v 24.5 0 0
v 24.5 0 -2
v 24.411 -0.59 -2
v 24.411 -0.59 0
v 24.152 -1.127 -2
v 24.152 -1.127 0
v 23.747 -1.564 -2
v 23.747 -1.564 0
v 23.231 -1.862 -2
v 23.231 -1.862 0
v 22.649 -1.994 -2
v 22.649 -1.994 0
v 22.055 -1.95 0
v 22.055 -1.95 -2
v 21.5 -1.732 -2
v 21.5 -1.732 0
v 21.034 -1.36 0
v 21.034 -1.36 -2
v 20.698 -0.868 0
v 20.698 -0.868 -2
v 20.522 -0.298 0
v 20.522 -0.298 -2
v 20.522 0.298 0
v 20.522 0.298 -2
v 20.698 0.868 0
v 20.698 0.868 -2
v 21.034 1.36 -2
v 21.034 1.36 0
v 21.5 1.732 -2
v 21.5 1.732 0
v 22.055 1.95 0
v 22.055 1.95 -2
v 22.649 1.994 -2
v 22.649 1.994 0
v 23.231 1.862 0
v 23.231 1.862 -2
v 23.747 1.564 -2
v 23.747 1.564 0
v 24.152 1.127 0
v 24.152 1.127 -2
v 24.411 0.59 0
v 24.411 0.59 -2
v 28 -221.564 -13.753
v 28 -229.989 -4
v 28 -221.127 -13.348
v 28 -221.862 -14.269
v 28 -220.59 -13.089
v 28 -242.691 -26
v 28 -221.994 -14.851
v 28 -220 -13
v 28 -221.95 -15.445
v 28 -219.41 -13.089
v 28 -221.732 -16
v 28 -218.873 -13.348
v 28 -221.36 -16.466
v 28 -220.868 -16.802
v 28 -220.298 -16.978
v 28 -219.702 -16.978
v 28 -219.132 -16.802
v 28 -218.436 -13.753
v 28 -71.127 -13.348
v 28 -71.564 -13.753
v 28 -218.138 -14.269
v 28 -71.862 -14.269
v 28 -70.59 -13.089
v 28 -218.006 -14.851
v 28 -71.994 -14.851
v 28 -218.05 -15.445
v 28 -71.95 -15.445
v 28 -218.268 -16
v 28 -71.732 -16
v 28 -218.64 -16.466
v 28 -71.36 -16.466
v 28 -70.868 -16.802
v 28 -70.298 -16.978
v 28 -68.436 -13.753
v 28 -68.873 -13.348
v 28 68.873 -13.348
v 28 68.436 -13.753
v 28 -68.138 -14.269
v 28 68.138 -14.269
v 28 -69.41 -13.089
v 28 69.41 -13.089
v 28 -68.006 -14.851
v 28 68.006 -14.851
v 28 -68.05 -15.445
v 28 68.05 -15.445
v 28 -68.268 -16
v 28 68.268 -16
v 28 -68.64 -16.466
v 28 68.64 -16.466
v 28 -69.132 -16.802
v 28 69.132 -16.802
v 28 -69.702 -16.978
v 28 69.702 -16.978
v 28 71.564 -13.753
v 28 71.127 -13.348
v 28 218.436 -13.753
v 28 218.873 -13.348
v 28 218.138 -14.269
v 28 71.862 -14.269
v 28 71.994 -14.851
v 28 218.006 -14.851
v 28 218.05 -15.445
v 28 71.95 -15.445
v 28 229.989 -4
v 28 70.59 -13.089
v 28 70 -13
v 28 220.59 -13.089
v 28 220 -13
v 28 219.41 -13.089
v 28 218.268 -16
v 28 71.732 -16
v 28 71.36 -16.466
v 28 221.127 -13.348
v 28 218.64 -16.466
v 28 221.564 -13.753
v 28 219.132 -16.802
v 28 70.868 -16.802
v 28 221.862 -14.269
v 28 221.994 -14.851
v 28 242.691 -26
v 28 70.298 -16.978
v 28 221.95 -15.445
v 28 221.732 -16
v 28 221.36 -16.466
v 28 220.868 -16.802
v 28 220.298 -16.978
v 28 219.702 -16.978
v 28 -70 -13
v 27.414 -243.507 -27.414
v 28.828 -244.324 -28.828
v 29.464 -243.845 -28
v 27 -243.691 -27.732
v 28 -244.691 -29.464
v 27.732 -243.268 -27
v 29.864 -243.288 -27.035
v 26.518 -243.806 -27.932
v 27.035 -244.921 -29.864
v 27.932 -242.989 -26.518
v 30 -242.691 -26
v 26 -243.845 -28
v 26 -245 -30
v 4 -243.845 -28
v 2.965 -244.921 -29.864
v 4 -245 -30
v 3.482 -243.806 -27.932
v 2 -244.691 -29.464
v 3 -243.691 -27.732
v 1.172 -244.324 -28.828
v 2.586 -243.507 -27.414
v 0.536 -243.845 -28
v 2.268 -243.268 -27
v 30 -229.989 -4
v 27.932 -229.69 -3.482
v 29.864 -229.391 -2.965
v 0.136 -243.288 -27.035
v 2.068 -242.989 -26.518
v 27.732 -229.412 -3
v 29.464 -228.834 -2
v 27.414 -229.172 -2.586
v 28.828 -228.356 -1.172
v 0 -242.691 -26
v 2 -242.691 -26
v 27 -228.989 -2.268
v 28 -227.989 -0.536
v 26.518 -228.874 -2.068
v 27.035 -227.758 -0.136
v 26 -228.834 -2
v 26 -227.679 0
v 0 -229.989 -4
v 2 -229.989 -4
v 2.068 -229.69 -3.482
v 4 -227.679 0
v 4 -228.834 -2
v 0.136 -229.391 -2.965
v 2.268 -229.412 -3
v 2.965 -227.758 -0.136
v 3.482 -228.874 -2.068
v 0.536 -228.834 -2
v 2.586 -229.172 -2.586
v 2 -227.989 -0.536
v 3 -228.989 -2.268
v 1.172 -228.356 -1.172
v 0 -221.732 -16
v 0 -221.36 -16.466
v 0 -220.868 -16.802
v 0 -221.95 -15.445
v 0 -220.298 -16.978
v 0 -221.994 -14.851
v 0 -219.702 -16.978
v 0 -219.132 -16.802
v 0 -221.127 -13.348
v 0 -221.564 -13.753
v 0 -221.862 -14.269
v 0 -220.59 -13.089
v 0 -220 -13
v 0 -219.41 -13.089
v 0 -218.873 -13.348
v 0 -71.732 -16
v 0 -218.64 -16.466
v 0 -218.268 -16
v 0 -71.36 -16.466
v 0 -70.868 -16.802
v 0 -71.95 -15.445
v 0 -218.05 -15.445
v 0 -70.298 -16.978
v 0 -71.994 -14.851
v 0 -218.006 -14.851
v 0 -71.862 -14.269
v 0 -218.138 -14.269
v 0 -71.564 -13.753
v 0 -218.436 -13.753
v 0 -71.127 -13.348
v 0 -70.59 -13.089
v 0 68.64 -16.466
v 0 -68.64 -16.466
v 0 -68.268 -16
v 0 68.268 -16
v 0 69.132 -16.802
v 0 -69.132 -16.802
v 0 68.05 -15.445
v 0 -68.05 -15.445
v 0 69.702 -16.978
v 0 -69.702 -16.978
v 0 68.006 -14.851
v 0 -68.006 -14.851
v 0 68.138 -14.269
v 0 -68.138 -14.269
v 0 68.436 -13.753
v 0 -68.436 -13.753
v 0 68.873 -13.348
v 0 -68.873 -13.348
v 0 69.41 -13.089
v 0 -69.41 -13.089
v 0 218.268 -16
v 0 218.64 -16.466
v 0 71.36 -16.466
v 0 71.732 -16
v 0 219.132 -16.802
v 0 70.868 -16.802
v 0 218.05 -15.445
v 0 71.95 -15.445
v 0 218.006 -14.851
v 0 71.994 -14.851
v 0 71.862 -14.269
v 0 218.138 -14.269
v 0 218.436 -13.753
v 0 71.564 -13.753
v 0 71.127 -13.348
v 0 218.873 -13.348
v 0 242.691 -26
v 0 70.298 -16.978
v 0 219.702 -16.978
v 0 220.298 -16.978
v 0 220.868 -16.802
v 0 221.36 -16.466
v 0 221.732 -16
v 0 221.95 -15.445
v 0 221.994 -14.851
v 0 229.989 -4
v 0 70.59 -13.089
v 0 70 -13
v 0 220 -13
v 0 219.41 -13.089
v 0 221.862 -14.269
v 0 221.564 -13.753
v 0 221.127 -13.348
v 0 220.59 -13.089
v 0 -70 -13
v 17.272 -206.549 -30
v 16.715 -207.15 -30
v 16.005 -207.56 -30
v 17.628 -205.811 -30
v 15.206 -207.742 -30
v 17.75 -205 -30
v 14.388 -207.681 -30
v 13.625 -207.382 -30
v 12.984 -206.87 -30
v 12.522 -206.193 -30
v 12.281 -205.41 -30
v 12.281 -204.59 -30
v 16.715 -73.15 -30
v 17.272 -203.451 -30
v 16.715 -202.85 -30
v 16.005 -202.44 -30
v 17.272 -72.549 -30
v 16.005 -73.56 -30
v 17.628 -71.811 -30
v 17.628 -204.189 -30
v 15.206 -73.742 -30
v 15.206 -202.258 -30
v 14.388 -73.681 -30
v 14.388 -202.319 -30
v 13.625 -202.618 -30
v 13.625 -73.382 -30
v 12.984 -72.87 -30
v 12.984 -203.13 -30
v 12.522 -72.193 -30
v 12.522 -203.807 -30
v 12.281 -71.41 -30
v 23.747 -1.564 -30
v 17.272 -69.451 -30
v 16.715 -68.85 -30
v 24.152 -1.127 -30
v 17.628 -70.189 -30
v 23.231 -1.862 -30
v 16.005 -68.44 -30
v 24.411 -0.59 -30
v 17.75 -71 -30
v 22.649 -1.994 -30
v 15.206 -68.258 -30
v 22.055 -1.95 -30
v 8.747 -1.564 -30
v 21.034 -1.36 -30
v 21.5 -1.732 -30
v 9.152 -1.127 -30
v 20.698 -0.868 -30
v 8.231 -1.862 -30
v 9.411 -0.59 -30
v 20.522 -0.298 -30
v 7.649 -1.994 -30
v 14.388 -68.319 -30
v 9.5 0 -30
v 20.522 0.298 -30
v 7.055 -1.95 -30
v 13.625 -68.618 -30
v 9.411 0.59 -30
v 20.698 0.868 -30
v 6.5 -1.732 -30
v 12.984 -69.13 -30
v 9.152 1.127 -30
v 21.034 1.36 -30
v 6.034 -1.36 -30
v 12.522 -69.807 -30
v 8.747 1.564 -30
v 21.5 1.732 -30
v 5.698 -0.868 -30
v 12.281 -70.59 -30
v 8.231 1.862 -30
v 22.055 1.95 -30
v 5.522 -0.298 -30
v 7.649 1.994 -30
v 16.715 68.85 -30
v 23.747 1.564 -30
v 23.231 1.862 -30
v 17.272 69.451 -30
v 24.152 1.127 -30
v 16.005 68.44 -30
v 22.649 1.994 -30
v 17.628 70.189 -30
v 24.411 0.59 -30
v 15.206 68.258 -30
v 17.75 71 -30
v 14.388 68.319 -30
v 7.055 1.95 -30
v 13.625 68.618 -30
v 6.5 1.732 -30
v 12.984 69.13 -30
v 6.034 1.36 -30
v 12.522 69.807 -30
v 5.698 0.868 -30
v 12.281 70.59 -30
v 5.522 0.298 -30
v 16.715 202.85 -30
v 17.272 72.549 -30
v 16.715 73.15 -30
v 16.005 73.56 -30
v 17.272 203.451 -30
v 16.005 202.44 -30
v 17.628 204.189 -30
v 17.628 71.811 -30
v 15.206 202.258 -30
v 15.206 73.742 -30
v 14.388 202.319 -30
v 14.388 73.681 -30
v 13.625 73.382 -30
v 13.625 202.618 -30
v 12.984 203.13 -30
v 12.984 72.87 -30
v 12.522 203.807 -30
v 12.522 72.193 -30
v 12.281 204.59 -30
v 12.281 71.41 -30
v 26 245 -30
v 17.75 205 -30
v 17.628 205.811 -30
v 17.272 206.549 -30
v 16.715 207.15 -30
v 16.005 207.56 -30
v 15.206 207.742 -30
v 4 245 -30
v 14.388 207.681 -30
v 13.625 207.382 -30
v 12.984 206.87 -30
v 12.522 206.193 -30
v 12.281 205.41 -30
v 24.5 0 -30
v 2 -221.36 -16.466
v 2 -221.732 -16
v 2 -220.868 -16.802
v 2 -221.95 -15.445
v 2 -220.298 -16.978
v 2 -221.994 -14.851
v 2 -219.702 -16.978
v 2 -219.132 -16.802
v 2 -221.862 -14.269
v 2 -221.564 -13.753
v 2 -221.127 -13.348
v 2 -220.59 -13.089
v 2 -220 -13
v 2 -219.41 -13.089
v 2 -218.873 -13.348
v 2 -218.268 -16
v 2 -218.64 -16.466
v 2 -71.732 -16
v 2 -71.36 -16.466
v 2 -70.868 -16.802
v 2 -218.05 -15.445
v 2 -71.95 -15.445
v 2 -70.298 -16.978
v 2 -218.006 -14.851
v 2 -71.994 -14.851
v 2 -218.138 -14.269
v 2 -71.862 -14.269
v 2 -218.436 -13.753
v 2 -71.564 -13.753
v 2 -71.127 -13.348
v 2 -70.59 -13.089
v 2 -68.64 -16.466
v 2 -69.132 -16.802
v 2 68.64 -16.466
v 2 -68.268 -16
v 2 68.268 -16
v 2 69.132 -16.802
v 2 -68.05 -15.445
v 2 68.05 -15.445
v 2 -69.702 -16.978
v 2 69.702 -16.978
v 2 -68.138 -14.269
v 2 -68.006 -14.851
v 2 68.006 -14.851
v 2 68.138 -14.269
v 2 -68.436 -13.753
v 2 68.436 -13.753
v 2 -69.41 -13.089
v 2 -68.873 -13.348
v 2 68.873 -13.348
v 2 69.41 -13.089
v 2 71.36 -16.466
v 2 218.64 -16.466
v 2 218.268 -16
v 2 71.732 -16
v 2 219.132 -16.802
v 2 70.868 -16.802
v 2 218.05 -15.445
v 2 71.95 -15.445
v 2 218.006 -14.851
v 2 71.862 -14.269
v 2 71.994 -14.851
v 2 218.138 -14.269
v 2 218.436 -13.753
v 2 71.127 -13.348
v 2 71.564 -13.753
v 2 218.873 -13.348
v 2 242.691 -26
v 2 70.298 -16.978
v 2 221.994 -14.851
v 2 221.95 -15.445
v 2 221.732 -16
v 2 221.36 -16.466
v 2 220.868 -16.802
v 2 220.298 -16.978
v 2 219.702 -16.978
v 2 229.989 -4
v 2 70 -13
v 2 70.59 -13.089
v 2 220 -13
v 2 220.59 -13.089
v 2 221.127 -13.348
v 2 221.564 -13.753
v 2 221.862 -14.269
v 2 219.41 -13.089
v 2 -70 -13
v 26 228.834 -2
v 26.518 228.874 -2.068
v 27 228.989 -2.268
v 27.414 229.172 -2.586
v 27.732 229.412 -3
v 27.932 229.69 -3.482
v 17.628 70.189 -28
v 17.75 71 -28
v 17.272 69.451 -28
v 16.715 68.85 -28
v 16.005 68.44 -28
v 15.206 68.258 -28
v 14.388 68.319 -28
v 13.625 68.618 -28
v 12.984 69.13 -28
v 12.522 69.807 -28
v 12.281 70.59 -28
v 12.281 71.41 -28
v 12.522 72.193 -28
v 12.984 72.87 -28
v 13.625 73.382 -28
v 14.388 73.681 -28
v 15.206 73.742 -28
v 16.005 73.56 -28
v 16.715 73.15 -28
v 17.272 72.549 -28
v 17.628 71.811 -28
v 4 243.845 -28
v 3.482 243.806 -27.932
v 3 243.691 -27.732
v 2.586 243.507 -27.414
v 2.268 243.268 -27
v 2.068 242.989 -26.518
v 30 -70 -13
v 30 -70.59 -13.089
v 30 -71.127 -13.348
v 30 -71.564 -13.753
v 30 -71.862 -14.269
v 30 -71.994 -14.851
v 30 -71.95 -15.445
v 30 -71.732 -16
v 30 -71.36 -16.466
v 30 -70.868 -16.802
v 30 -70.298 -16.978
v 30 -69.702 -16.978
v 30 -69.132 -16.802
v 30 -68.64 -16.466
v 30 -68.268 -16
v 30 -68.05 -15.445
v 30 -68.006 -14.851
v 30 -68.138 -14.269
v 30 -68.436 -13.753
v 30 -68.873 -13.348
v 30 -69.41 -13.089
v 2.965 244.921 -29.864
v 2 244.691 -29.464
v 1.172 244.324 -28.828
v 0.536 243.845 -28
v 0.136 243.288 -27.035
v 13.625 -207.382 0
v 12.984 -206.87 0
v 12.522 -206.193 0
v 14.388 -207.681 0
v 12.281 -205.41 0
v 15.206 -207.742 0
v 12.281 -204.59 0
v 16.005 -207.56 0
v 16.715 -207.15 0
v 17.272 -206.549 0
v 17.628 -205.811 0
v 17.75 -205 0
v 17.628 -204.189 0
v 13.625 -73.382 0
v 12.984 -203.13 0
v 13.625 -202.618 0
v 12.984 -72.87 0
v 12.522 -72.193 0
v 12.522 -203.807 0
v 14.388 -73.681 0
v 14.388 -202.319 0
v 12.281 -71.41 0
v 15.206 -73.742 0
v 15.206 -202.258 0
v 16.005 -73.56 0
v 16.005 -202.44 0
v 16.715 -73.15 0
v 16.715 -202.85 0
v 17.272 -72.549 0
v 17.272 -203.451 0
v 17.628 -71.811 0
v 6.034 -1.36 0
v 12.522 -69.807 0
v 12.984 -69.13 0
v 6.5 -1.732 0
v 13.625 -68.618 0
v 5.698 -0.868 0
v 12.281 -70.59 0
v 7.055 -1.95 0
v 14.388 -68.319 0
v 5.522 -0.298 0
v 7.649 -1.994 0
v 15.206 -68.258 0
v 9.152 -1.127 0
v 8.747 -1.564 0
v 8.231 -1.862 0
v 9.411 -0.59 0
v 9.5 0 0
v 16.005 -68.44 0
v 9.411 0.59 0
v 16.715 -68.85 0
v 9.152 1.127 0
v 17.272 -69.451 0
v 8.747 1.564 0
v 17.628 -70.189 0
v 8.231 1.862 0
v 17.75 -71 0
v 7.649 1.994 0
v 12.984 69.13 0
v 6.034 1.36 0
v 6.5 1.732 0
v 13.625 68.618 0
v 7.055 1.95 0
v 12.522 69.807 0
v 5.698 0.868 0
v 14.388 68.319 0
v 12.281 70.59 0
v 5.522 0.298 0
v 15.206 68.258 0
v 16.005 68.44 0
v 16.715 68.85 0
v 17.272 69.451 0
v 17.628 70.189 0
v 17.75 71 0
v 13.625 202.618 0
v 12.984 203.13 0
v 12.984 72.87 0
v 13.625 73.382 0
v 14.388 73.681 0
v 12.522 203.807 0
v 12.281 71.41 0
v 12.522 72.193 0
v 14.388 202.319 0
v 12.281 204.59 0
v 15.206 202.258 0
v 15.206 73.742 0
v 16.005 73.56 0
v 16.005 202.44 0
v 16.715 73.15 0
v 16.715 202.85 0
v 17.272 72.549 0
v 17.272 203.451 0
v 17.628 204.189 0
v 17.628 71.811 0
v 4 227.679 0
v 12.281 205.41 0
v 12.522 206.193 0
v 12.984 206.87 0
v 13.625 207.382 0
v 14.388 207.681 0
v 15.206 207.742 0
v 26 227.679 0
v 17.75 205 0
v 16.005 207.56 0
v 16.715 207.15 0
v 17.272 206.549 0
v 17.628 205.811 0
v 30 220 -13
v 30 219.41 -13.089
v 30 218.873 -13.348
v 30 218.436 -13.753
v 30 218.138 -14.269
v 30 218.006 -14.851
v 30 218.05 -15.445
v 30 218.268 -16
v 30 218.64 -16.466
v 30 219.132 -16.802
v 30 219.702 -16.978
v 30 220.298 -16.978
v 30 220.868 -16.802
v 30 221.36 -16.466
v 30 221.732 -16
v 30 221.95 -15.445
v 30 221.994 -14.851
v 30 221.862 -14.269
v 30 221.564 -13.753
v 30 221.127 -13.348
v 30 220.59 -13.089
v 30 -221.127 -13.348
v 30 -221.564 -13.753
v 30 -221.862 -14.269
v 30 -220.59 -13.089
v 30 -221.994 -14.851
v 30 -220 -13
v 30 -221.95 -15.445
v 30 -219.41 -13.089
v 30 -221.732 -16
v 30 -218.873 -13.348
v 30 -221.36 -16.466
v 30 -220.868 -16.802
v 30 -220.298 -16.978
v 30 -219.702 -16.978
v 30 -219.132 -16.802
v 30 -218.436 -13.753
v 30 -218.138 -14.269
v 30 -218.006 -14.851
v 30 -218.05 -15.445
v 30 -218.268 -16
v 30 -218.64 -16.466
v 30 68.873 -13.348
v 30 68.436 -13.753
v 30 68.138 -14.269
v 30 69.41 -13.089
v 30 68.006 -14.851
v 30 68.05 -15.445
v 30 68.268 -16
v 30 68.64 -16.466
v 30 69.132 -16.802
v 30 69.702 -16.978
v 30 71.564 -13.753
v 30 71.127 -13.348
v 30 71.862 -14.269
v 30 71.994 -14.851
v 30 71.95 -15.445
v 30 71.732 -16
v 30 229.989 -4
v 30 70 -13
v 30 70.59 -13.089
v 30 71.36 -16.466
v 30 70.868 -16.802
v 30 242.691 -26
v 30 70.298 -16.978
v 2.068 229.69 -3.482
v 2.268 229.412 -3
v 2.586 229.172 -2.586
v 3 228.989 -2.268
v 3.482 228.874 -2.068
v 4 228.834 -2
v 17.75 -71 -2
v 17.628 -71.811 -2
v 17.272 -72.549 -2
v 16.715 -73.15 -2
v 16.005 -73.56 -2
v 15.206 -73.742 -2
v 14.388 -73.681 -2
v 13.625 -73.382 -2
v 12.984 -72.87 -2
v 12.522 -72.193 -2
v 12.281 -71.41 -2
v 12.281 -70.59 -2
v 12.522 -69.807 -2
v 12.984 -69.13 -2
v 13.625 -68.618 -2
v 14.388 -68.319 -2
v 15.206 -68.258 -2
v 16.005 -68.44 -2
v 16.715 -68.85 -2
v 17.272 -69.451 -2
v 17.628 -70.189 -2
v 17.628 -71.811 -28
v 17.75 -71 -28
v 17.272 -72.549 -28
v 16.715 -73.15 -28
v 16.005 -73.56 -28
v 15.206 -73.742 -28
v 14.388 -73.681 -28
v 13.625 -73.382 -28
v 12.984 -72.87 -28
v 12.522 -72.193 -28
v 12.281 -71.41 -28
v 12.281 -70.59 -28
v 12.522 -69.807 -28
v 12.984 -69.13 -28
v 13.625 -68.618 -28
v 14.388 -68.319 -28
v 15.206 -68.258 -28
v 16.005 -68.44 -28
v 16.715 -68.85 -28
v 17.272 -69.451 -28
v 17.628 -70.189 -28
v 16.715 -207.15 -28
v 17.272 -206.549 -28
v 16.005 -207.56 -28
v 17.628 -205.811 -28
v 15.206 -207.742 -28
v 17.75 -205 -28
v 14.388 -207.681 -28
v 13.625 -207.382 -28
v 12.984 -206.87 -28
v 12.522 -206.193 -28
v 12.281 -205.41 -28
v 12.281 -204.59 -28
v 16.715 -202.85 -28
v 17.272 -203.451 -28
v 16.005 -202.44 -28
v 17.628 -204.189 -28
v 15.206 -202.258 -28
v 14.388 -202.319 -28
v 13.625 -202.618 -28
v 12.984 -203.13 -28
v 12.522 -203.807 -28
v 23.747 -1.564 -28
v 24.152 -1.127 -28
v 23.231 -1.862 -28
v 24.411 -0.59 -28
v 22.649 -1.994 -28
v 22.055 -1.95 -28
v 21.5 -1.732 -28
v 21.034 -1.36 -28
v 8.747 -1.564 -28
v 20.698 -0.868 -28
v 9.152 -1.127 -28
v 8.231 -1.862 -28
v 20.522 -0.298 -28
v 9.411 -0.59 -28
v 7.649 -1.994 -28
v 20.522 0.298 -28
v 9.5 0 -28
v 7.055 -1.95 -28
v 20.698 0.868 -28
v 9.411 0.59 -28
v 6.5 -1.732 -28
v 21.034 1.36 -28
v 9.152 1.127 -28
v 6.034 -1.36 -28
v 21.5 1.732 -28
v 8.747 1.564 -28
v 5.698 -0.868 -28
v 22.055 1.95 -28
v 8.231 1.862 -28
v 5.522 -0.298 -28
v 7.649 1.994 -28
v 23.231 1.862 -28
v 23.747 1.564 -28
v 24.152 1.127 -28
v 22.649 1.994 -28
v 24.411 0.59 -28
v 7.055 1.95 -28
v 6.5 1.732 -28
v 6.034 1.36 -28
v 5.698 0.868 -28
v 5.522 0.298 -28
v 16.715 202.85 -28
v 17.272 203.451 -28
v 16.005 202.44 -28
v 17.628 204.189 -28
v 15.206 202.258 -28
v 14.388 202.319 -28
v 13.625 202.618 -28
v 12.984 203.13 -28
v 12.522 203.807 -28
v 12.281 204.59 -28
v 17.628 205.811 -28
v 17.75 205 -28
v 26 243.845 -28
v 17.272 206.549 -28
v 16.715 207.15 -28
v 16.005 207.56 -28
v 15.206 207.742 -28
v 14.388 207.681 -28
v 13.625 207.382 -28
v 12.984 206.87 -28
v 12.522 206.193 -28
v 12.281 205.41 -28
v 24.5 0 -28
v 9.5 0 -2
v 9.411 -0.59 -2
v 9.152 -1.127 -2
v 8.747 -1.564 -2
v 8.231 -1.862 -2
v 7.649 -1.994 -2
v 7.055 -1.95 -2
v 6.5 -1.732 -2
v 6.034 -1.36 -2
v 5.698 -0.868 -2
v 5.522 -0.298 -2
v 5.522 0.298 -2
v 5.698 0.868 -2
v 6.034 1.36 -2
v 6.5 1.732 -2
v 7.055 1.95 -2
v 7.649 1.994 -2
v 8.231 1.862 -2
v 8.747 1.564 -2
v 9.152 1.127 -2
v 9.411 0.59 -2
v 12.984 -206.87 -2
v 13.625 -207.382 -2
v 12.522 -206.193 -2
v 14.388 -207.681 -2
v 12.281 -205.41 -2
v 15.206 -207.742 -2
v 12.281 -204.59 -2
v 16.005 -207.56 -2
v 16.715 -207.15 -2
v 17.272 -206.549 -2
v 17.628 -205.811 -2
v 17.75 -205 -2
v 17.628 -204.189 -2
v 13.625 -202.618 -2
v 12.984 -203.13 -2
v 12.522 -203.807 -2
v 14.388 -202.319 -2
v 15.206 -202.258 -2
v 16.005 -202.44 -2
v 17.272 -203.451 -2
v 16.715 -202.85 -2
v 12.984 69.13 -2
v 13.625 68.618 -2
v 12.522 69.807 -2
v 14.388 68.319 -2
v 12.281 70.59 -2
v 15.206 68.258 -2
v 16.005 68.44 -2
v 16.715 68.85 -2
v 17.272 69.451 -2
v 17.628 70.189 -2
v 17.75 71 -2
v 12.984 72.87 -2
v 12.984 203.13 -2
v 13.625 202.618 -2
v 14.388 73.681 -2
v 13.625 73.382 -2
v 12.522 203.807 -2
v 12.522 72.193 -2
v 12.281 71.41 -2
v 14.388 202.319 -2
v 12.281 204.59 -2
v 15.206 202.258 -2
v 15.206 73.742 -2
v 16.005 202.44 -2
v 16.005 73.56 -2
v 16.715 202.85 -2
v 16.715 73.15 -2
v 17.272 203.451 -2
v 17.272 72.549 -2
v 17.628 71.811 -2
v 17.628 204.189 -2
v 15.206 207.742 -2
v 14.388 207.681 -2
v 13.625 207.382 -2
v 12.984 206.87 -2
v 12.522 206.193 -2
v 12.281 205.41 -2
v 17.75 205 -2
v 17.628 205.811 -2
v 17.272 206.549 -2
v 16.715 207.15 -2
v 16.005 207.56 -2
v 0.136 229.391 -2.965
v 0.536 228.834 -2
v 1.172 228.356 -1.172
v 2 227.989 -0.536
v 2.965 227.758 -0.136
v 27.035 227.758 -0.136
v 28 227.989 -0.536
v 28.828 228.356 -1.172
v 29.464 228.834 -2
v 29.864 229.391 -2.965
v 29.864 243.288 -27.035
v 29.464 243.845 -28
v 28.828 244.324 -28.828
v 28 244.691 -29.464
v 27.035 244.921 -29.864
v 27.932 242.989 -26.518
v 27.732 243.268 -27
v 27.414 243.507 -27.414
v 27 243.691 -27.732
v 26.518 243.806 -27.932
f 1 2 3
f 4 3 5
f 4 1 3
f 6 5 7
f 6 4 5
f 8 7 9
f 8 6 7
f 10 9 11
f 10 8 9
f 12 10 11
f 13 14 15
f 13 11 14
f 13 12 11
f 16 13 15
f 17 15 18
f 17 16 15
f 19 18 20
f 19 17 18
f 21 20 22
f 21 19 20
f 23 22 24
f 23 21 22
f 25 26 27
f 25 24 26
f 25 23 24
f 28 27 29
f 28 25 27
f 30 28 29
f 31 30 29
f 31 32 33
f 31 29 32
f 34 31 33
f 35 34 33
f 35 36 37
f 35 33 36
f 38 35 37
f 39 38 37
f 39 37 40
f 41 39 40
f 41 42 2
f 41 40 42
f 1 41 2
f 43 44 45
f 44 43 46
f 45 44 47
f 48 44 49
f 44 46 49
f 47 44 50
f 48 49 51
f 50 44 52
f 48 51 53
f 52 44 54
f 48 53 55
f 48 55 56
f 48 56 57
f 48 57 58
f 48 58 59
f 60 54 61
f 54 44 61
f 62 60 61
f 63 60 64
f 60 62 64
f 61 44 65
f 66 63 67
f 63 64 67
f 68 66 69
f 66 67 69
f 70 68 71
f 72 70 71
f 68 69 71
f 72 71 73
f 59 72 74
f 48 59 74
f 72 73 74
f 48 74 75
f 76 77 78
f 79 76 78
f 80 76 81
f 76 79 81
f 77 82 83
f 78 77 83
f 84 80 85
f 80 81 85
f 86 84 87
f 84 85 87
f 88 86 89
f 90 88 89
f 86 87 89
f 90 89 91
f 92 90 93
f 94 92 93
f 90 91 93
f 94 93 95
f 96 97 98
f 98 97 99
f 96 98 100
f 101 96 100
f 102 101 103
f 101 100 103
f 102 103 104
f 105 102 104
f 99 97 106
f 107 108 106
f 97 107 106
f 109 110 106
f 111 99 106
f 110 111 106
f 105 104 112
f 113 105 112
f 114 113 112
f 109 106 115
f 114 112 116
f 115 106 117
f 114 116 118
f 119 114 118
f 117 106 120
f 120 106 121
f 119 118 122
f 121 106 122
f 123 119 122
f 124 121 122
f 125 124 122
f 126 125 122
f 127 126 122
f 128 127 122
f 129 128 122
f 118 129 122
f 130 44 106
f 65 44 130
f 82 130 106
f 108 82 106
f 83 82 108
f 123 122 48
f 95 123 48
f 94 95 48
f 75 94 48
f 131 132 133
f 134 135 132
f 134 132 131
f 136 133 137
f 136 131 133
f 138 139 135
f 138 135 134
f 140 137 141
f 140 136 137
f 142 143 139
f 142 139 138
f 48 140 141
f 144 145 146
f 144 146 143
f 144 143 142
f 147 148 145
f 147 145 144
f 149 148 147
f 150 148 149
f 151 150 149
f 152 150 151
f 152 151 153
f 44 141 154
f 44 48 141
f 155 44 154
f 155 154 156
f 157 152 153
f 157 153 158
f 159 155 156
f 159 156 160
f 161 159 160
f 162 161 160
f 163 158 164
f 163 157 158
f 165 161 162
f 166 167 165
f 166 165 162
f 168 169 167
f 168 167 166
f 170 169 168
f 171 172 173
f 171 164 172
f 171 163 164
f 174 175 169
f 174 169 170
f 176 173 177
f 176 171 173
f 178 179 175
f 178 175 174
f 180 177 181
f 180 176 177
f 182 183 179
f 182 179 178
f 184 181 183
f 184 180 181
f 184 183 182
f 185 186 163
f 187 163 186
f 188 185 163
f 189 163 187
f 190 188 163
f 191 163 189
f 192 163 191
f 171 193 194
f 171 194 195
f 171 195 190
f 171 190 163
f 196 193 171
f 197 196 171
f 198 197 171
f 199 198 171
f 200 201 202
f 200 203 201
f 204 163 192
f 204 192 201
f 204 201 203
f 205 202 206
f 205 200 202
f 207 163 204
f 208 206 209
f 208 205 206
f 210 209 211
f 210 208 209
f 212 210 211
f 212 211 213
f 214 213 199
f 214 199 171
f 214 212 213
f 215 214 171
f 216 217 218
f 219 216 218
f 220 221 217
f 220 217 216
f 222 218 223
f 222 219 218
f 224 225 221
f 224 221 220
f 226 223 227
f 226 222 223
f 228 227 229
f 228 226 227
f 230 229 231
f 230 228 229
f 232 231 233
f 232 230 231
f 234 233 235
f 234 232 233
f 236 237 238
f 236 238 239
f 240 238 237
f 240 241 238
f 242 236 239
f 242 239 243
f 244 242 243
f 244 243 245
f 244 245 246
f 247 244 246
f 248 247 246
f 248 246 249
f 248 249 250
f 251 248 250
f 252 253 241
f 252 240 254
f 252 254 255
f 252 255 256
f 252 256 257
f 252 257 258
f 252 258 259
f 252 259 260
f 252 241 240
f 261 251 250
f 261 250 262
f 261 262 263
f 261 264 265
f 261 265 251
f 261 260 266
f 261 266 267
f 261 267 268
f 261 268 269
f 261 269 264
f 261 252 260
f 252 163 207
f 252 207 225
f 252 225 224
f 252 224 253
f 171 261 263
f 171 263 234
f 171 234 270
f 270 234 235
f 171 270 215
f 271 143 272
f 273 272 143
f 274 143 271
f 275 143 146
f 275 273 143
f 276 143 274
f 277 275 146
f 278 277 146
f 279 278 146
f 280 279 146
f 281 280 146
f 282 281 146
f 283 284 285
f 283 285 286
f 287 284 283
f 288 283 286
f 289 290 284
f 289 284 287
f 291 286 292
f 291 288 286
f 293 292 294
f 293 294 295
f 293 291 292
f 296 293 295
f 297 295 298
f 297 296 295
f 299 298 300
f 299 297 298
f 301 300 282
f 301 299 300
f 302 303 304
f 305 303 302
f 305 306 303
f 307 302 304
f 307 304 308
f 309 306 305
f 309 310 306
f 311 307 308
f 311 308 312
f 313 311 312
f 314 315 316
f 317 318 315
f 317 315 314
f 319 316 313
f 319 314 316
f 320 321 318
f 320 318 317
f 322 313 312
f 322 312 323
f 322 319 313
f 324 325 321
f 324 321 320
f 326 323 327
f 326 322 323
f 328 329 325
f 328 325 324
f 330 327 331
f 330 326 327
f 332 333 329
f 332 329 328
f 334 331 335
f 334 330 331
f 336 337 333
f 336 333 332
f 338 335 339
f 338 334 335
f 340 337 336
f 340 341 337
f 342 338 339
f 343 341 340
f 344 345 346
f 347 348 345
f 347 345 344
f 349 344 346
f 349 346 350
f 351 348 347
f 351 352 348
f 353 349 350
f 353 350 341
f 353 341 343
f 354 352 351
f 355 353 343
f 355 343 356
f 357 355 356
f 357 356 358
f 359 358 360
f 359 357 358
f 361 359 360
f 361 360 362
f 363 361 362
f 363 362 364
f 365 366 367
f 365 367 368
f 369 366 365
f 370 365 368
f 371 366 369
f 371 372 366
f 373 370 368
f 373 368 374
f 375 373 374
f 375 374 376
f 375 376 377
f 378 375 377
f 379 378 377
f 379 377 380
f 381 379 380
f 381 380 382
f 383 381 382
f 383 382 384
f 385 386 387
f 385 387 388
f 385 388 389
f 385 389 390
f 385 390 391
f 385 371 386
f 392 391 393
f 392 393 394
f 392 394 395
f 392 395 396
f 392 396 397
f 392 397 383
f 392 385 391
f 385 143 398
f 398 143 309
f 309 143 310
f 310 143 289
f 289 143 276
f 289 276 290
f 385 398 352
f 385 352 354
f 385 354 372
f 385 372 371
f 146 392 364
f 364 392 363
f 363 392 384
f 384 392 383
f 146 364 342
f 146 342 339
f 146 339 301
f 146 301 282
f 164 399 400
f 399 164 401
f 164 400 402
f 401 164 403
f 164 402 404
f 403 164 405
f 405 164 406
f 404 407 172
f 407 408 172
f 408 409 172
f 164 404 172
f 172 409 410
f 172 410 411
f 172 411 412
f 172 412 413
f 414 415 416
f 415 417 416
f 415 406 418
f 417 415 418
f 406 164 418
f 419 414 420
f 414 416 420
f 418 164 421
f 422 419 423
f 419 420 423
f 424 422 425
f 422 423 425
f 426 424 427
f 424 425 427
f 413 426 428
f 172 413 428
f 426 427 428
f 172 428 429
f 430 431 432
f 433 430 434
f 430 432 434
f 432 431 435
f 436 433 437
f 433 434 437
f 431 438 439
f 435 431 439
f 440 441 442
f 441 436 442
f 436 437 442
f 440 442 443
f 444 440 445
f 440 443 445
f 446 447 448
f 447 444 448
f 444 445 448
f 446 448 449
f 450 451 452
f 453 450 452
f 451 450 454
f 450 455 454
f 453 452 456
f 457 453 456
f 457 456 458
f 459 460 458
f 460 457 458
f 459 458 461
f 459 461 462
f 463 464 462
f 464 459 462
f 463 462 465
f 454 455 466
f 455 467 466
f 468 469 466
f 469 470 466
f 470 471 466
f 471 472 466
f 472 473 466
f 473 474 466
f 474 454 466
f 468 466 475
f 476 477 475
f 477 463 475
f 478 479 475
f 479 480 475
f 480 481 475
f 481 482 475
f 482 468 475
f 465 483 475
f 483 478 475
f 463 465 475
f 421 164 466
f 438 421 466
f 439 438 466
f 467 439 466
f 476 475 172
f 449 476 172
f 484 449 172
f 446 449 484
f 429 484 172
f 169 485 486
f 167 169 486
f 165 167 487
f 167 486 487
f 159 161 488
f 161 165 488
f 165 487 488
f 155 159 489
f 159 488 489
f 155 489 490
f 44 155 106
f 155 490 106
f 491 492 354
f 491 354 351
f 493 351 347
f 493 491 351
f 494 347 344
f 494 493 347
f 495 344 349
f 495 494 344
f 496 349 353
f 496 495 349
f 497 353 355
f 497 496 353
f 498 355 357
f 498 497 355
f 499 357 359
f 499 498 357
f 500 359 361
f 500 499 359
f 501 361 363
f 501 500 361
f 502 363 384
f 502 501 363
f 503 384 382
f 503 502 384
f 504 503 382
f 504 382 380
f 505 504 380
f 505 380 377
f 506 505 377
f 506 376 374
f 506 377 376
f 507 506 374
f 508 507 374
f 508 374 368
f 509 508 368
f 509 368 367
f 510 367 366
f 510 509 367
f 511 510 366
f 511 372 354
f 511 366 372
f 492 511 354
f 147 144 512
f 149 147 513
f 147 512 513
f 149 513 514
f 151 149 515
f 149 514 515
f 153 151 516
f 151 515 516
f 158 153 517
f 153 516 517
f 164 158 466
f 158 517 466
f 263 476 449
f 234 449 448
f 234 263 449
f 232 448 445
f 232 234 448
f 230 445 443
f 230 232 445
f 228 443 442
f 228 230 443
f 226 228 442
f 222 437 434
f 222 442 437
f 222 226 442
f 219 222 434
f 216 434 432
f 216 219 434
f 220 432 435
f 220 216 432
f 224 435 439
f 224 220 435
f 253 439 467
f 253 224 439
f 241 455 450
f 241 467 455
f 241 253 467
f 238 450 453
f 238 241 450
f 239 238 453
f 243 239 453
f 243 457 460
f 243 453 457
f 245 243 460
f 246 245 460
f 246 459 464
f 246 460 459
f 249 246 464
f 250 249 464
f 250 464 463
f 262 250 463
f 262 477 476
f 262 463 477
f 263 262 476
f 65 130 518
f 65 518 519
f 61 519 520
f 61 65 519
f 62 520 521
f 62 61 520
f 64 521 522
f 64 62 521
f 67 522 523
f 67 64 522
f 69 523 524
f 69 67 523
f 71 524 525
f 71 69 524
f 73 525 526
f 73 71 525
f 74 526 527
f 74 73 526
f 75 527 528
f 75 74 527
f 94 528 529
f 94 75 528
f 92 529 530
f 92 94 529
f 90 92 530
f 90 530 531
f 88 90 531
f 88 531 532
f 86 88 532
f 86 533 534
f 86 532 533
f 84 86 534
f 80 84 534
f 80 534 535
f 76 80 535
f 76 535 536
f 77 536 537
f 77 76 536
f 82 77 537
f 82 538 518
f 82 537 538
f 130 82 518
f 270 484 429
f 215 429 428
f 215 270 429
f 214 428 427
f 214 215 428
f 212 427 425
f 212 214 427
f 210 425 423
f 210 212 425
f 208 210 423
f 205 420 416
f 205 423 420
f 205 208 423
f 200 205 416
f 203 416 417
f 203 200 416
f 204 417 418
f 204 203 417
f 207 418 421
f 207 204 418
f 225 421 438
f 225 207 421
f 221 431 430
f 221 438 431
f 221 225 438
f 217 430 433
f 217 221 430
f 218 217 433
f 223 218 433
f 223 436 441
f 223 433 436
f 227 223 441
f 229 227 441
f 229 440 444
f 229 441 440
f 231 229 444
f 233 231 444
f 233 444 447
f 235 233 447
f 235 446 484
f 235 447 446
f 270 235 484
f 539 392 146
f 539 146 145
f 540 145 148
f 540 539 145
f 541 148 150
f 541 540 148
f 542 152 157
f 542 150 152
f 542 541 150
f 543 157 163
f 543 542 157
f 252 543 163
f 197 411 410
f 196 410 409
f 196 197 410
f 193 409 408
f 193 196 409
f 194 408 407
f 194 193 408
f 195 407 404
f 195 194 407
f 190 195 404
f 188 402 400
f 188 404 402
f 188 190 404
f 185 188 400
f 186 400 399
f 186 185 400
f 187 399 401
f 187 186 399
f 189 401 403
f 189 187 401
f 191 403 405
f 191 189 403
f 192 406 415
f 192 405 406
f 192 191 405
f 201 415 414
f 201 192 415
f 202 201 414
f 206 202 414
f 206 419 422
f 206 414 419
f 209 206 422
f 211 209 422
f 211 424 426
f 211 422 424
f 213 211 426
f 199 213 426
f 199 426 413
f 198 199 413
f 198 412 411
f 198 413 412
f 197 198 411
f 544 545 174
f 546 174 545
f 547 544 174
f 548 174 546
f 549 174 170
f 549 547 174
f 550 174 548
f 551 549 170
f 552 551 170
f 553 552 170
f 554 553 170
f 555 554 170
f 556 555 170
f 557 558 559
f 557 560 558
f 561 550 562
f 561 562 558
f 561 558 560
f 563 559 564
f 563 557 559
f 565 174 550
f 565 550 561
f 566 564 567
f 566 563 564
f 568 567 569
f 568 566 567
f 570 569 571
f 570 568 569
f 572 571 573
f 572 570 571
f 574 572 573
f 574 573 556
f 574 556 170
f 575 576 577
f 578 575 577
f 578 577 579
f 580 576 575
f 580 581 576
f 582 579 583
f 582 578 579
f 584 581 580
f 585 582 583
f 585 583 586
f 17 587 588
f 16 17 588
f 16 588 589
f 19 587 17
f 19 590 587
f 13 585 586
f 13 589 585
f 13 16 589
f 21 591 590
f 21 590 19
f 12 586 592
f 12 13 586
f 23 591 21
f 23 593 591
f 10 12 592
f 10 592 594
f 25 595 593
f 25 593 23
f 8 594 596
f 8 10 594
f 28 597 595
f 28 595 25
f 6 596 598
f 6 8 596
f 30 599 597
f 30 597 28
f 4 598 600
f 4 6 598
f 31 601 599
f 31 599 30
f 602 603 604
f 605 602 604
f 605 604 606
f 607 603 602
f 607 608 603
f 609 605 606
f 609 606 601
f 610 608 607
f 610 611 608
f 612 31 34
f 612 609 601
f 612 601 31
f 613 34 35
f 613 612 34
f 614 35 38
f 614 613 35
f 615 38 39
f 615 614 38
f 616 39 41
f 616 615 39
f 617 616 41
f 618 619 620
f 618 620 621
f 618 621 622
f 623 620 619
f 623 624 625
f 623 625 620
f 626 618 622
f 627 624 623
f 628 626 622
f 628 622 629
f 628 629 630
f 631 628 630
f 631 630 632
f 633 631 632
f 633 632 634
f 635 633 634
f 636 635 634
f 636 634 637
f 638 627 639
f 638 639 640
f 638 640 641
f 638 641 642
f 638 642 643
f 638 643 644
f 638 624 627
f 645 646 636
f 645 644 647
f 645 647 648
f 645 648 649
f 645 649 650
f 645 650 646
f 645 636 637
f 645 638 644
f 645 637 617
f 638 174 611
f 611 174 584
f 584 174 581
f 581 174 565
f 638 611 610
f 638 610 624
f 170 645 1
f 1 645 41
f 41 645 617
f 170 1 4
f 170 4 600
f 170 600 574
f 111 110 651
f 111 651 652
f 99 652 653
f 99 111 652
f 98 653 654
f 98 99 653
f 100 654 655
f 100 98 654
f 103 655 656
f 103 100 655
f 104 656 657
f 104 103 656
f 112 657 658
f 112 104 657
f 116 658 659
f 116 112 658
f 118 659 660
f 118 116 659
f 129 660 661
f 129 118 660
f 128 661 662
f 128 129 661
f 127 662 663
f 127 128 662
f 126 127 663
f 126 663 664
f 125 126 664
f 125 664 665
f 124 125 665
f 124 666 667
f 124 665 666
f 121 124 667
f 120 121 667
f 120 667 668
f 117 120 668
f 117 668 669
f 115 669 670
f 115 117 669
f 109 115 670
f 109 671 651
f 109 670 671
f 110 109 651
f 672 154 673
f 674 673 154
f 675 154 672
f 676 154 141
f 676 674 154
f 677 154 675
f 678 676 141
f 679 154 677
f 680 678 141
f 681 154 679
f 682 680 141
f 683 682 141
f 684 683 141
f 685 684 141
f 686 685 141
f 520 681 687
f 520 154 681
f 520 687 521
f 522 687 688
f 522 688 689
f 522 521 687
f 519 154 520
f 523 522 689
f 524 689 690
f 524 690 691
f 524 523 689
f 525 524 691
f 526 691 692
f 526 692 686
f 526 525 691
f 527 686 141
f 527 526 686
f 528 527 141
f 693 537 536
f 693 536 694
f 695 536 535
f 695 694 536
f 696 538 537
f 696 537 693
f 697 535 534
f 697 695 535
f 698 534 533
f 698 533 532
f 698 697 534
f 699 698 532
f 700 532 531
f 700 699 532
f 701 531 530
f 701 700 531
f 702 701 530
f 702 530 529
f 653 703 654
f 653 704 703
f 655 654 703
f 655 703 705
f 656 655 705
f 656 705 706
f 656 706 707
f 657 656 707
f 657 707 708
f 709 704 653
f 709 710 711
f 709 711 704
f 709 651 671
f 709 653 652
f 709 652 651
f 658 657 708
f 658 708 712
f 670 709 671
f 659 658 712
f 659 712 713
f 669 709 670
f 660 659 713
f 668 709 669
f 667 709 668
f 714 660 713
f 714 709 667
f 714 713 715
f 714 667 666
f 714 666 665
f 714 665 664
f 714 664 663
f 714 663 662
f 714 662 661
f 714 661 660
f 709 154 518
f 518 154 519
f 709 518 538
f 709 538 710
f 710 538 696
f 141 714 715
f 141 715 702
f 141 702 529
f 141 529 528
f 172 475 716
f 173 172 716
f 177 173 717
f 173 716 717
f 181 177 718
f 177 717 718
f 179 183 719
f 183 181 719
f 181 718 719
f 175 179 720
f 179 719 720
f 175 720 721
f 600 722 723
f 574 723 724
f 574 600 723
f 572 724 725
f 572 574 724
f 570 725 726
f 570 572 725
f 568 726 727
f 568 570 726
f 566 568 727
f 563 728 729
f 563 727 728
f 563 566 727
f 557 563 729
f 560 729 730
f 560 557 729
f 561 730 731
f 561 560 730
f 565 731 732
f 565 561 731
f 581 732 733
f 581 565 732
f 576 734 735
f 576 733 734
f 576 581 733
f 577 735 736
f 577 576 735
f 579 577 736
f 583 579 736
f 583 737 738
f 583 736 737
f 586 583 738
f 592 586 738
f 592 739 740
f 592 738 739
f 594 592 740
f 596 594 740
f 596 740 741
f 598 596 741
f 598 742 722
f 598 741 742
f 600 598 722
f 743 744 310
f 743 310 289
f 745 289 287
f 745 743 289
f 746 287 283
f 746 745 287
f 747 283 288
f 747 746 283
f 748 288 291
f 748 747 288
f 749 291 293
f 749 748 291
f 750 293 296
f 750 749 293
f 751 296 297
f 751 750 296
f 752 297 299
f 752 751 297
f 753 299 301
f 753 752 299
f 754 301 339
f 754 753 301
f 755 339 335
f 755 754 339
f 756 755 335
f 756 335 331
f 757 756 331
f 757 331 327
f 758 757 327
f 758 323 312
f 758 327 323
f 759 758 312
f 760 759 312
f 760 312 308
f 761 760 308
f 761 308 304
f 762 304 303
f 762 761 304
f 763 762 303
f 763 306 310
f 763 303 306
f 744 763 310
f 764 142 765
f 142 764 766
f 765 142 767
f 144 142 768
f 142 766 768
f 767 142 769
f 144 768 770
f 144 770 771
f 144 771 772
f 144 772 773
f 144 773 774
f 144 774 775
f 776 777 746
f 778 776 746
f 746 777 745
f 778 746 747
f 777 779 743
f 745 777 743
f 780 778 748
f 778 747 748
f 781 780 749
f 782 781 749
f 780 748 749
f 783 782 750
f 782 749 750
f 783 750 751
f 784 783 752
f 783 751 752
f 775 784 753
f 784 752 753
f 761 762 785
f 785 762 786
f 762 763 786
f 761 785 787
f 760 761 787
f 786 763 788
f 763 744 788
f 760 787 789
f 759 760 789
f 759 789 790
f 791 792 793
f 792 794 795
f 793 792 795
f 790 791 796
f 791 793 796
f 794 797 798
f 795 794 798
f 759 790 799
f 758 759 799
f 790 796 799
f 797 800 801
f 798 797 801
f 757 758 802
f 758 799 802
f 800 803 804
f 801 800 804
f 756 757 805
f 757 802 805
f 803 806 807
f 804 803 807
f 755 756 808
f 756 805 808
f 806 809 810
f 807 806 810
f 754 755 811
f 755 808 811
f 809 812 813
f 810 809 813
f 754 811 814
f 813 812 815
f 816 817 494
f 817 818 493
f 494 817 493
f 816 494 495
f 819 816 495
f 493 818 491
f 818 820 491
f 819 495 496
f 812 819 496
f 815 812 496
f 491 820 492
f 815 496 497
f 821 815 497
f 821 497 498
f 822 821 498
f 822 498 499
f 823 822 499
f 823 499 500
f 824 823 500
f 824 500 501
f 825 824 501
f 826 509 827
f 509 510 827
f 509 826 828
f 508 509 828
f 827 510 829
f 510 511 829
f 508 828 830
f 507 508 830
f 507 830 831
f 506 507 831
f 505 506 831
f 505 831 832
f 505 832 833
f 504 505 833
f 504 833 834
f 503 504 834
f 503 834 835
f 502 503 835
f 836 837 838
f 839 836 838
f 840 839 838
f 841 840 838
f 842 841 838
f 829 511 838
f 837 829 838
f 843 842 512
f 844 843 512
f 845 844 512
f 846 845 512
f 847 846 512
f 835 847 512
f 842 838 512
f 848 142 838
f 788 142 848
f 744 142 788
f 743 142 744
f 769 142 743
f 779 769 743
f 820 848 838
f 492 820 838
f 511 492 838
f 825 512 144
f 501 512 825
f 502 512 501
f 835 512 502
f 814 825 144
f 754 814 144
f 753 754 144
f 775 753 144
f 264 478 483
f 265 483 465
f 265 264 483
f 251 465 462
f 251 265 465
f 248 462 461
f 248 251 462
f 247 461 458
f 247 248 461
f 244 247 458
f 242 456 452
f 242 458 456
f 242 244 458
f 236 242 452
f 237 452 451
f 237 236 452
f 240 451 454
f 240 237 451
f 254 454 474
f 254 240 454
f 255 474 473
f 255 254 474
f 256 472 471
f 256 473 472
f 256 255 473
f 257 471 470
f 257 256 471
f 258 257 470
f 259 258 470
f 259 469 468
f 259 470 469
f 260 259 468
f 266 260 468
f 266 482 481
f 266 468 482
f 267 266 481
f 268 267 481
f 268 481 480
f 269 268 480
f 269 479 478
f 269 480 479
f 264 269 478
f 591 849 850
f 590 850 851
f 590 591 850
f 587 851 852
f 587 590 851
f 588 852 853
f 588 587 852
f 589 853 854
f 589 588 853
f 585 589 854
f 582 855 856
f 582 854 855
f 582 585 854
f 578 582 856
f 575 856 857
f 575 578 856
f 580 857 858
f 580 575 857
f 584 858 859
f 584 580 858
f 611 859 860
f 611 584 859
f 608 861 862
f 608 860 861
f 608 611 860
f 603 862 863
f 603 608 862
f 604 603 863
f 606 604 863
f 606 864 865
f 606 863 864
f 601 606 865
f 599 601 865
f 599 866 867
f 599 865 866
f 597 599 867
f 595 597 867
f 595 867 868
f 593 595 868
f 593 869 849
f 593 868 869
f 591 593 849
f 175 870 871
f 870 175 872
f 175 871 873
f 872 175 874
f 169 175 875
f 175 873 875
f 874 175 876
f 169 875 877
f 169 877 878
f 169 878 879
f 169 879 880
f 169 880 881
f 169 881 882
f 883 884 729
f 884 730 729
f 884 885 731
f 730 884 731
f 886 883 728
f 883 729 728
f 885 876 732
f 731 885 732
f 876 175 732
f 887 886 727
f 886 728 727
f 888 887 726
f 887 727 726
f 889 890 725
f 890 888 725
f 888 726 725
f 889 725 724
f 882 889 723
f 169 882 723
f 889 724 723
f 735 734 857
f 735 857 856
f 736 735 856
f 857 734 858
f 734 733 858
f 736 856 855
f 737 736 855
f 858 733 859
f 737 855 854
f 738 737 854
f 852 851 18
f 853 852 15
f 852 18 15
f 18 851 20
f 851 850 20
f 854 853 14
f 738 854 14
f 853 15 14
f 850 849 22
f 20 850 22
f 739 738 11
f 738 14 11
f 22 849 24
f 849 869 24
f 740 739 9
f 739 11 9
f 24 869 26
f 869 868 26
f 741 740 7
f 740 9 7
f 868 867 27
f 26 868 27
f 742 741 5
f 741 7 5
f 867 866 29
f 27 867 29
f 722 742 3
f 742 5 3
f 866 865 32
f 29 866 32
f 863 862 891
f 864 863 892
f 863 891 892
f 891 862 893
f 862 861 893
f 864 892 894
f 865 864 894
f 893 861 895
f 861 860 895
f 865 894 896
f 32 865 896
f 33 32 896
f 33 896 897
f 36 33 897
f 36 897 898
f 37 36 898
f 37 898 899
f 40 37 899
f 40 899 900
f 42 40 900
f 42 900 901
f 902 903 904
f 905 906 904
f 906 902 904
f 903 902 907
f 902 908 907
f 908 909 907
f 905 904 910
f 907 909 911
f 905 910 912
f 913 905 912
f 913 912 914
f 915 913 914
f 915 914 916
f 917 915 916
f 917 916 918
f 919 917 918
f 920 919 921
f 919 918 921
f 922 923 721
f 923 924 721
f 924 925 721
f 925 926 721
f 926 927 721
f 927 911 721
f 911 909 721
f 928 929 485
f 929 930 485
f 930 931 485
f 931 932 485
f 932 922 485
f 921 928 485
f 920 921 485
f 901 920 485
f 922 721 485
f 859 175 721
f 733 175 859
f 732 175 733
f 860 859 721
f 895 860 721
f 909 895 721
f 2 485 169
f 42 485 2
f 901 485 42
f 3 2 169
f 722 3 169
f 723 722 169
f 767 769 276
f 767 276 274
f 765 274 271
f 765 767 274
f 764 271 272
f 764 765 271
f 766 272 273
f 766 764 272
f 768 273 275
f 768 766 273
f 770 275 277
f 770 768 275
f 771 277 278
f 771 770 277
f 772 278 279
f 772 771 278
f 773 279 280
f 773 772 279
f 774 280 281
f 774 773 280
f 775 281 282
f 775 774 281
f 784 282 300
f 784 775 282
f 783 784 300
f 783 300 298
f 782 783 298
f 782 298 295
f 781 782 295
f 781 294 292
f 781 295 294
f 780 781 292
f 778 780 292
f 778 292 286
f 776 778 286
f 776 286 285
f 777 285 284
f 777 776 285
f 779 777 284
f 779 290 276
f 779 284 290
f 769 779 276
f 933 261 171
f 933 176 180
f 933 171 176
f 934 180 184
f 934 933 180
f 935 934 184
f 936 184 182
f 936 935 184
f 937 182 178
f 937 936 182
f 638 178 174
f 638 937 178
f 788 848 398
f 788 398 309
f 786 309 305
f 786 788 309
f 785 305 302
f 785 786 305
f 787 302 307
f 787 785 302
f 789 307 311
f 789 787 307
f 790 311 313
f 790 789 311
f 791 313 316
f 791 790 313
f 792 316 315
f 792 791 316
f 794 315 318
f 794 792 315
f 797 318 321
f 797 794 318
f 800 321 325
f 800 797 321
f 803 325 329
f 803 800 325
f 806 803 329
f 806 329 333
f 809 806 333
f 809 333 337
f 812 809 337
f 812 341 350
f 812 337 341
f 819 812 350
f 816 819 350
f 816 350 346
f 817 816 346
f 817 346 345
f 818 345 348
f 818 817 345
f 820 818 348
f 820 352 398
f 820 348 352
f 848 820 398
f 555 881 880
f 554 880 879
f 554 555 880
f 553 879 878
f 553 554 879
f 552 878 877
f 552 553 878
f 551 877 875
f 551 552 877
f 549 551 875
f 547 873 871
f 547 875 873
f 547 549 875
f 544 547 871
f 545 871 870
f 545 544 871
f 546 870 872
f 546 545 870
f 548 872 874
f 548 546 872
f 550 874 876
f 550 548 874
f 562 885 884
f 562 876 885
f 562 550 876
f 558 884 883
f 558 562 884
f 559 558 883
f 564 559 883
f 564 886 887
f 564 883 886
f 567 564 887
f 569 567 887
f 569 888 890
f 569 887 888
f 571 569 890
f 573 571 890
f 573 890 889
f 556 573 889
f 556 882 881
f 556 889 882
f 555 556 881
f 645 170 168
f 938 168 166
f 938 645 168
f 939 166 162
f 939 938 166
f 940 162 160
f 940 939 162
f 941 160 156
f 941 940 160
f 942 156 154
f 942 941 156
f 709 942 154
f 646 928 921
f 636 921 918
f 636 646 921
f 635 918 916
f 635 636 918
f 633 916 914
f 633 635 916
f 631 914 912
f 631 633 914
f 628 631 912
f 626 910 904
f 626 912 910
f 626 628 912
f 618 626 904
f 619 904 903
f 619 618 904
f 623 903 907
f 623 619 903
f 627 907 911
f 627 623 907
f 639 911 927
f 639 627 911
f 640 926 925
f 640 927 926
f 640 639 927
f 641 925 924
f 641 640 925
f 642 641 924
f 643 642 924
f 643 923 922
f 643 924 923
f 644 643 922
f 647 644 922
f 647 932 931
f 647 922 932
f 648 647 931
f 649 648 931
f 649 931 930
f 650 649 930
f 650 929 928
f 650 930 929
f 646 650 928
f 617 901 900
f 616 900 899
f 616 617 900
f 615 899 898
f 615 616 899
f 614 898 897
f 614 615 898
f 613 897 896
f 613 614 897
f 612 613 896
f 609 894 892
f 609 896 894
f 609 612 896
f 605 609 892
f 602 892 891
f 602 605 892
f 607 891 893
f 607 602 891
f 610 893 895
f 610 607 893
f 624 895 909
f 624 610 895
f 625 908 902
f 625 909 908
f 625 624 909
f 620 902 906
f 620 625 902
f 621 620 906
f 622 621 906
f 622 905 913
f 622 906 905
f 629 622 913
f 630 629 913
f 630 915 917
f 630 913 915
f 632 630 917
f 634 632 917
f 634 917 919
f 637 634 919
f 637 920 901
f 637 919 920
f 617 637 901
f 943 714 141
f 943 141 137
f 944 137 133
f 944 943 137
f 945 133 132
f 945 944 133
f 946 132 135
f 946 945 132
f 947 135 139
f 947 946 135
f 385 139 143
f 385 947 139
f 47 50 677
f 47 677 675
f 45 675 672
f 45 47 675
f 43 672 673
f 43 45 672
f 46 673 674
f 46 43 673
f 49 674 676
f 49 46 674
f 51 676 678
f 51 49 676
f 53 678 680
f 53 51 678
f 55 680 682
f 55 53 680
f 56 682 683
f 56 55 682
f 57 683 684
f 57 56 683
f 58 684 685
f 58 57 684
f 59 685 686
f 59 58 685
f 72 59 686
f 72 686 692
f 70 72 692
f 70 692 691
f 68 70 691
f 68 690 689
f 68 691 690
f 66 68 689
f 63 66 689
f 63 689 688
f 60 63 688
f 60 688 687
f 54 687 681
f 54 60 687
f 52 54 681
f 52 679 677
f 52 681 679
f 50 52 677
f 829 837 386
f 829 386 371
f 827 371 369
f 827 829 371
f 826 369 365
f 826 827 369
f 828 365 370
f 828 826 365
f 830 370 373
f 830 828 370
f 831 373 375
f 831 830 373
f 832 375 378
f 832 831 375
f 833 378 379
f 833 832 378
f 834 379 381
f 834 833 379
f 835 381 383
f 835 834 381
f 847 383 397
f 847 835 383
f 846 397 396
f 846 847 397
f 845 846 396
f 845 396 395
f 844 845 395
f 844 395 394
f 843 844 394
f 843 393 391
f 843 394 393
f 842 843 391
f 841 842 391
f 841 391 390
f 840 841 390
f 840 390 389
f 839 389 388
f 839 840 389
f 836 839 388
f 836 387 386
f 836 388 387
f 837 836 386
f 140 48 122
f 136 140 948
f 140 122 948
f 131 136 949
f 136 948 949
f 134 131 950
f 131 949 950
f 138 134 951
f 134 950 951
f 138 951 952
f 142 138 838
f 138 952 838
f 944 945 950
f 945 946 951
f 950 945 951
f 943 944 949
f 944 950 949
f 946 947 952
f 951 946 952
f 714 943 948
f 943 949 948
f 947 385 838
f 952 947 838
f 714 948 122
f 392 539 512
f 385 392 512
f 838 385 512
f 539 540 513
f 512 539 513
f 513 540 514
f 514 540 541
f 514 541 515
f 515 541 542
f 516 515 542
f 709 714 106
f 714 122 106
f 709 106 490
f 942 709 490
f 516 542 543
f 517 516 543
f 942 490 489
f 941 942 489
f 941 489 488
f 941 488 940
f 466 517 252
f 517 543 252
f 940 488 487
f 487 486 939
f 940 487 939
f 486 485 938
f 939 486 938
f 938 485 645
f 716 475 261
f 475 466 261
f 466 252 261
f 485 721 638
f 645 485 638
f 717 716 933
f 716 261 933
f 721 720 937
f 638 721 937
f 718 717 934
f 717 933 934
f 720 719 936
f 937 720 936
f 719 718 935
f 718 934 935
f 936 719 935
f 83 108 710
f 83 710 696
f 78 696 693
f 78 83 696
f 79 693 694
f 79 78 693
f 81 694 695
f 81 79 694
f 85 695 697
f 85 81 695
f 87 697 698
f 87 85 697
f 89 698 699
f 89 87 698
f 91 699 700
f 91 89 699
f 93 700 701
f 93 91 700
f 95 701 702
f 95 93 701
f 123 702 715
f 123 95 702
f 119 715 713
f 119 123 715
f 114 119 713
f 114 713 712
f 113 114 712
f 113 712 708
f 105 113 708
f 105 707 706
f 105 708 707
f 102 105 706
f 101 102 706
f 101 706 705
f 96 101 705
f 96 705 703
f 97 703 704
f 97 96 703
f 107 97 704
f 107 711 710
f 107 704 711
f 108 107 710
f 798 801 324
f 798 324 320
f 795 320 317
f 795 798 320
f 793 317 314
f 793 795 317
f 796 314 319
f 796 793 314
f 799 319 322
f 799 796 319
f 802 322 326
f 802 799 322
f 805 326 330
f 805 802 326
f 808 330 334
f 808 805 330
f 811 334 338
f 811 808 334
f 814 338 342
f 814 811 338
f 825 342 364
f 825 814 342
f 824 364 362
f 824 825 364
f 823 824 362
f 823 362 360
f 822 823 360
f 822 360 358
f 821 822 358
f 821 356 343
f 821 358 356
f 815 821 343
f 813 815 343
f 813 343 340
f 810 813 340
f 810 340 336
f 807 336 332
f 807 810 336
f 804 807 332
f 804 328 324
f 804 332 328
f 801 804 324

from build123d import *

# Parameters (mm, degrees)
EXTRUDE_1_DEPTH          = 245
SKETCH_2_R               = 2
SKETCH_2_R_2             = 2.75
CUT_EXTRUDE_1_DEPTH      = 249.646335183
CUT_EXTRUDE_3_DEPTH      = 249.646335183
CUT_EXTRUDE_3_DEPTH_BACK = 249.646335183
SKETCH_4_R               = 2
CUT_EXTRUDE_4_DEPTH      = 249.646335183


with BuildPart() as part:
    # 草图1 → 凸台-拉伸1 (new, symmetric)
    with BuildSketch(Plane(origin=(0, 0, 0), x_dir=(1, 0, 0), z_dir=(0, 1, 0))):
        with BuildLine():
            Line((4, 0), (26, 0))
            ThreePointArc((26, 0), (28.828427125, 1.171572875), (30, 4))
            Line((30, 4), (30, 26))
            ThreePointArc((30, 26), (28.828427125, 28.828427125), (26, 30))
            Line((26, 30), (4, 30))
            ThreePointArc((4, 30), (1.171572875, 28.828427125), (0, 26))
            Line((0, 26), (0, 4))
            ThreePointArc((0, 4), (1.171572875, 1.171572875), (4, 0))
        make_face()
        with BuildLine():
            Line((4, 2), (26, 2))
            ThreePointArc((26, 2), (27.414213562, 2.585786438), (28, 4))
            Line((28, 4), (28, 26))
            ThreePointArc((28, 26), (27.414213562, 27.414213562), (26, 28))
            Line((26, 28), (4, 28))
            ThreePointArc((4, 28), (2.585786438, 27.414213562), (2, 26))
            Line((2, 26), (2, 4))
            ThreePointArc((2, 4), (2.585786438, 2.585786438), (4, 2))
        make_face(mode=Mode.SUBTRACT)
    extrude(amount=EXTRUDE_1_DEPTH, both=True)

    # 草图2 → 切除-拉伸1 (cut, through all)
    with BuildSketch(Plane(origin=(0, 0, 0), x_dir=(-1, 0, 0), z_dir=(0, 0, -1))):
        with Locations(Location((-22.5, 0, 0), (0, 0, 180))):
            Circle(SKETCH_2_R)
        with Locations(Location((-7.5, 0, 0), (0, 0, 180))):
            Circle(SKETCH_2_R)
        with Locations(Location((-15, 205, 0), (0, 0, 180))):
            Circle(SKETCH_2_R_2)
        with Locations(Location((-15, 71, 0), (0, 0, 180))):
            Circle(SKETCH_2_R_2)
        with Locations(Location((-15, -71, 0), (0, 0, 180))):
            Circle(SKETCH_2_R_2)
        with Locations(Location((-15, -205, 0), (0, 0, 180))):
            Circle(SKETCH_2_R_2)
    extrude(amount=CUT_EXTRUDE_1_DEPTH, mode=Mode.SUBTRACT)

    # 草图3 → 切除-拉伸3 (cut, two sides: drawn at the far end of the back side and taken through both)
    with BuildSketch(Plane(origin=(0, 0, 0), x_dir=(0, 0, -1), z_dir=(1, 0, 0)).offset(-CUT_EXTRUDE_3_DEPTH_BACK)):
        Polygon((30, 245), (0, 227.679491924), (0, 245), align=None)
        Polygon((0, -245), (30, -245), (0, -227.679491924), align=None)
    extrude(amount=CUT_EXTRUDE_3_DEPTH + CUT_EXTRUDE_3_DEPTH_BACK, mode=Mode.SUBTRACT)

    # 草图4 → 切除-拉伸4 (cut, through all)
    with BuildSketch(Plane(origin=(0, 0, 0), x_dir=(0, 0, -1), z_dir=(1, 0, 0))):
        with Locations(Location((15, 220, 0), (0, 0, 180))):
            Circle(SKETCH_4_R)
        with Locations(Location((15, 70, 0), (0, 0, 180))):
            Circle(SKETCH_4_R)
        with Locations(Location((15, -70, 0), (0, 0, 180))):
            Circle(SKETCH_4_R)
        with Locations(Location((15, -220, 0), (0, 0, 180))):
            Circle(SKETCH_4_R)
    extrude(amount=CUT_EXTRUDE_4_DEPTH, mode=Mode.SUBTRACT)


solid = part.part
